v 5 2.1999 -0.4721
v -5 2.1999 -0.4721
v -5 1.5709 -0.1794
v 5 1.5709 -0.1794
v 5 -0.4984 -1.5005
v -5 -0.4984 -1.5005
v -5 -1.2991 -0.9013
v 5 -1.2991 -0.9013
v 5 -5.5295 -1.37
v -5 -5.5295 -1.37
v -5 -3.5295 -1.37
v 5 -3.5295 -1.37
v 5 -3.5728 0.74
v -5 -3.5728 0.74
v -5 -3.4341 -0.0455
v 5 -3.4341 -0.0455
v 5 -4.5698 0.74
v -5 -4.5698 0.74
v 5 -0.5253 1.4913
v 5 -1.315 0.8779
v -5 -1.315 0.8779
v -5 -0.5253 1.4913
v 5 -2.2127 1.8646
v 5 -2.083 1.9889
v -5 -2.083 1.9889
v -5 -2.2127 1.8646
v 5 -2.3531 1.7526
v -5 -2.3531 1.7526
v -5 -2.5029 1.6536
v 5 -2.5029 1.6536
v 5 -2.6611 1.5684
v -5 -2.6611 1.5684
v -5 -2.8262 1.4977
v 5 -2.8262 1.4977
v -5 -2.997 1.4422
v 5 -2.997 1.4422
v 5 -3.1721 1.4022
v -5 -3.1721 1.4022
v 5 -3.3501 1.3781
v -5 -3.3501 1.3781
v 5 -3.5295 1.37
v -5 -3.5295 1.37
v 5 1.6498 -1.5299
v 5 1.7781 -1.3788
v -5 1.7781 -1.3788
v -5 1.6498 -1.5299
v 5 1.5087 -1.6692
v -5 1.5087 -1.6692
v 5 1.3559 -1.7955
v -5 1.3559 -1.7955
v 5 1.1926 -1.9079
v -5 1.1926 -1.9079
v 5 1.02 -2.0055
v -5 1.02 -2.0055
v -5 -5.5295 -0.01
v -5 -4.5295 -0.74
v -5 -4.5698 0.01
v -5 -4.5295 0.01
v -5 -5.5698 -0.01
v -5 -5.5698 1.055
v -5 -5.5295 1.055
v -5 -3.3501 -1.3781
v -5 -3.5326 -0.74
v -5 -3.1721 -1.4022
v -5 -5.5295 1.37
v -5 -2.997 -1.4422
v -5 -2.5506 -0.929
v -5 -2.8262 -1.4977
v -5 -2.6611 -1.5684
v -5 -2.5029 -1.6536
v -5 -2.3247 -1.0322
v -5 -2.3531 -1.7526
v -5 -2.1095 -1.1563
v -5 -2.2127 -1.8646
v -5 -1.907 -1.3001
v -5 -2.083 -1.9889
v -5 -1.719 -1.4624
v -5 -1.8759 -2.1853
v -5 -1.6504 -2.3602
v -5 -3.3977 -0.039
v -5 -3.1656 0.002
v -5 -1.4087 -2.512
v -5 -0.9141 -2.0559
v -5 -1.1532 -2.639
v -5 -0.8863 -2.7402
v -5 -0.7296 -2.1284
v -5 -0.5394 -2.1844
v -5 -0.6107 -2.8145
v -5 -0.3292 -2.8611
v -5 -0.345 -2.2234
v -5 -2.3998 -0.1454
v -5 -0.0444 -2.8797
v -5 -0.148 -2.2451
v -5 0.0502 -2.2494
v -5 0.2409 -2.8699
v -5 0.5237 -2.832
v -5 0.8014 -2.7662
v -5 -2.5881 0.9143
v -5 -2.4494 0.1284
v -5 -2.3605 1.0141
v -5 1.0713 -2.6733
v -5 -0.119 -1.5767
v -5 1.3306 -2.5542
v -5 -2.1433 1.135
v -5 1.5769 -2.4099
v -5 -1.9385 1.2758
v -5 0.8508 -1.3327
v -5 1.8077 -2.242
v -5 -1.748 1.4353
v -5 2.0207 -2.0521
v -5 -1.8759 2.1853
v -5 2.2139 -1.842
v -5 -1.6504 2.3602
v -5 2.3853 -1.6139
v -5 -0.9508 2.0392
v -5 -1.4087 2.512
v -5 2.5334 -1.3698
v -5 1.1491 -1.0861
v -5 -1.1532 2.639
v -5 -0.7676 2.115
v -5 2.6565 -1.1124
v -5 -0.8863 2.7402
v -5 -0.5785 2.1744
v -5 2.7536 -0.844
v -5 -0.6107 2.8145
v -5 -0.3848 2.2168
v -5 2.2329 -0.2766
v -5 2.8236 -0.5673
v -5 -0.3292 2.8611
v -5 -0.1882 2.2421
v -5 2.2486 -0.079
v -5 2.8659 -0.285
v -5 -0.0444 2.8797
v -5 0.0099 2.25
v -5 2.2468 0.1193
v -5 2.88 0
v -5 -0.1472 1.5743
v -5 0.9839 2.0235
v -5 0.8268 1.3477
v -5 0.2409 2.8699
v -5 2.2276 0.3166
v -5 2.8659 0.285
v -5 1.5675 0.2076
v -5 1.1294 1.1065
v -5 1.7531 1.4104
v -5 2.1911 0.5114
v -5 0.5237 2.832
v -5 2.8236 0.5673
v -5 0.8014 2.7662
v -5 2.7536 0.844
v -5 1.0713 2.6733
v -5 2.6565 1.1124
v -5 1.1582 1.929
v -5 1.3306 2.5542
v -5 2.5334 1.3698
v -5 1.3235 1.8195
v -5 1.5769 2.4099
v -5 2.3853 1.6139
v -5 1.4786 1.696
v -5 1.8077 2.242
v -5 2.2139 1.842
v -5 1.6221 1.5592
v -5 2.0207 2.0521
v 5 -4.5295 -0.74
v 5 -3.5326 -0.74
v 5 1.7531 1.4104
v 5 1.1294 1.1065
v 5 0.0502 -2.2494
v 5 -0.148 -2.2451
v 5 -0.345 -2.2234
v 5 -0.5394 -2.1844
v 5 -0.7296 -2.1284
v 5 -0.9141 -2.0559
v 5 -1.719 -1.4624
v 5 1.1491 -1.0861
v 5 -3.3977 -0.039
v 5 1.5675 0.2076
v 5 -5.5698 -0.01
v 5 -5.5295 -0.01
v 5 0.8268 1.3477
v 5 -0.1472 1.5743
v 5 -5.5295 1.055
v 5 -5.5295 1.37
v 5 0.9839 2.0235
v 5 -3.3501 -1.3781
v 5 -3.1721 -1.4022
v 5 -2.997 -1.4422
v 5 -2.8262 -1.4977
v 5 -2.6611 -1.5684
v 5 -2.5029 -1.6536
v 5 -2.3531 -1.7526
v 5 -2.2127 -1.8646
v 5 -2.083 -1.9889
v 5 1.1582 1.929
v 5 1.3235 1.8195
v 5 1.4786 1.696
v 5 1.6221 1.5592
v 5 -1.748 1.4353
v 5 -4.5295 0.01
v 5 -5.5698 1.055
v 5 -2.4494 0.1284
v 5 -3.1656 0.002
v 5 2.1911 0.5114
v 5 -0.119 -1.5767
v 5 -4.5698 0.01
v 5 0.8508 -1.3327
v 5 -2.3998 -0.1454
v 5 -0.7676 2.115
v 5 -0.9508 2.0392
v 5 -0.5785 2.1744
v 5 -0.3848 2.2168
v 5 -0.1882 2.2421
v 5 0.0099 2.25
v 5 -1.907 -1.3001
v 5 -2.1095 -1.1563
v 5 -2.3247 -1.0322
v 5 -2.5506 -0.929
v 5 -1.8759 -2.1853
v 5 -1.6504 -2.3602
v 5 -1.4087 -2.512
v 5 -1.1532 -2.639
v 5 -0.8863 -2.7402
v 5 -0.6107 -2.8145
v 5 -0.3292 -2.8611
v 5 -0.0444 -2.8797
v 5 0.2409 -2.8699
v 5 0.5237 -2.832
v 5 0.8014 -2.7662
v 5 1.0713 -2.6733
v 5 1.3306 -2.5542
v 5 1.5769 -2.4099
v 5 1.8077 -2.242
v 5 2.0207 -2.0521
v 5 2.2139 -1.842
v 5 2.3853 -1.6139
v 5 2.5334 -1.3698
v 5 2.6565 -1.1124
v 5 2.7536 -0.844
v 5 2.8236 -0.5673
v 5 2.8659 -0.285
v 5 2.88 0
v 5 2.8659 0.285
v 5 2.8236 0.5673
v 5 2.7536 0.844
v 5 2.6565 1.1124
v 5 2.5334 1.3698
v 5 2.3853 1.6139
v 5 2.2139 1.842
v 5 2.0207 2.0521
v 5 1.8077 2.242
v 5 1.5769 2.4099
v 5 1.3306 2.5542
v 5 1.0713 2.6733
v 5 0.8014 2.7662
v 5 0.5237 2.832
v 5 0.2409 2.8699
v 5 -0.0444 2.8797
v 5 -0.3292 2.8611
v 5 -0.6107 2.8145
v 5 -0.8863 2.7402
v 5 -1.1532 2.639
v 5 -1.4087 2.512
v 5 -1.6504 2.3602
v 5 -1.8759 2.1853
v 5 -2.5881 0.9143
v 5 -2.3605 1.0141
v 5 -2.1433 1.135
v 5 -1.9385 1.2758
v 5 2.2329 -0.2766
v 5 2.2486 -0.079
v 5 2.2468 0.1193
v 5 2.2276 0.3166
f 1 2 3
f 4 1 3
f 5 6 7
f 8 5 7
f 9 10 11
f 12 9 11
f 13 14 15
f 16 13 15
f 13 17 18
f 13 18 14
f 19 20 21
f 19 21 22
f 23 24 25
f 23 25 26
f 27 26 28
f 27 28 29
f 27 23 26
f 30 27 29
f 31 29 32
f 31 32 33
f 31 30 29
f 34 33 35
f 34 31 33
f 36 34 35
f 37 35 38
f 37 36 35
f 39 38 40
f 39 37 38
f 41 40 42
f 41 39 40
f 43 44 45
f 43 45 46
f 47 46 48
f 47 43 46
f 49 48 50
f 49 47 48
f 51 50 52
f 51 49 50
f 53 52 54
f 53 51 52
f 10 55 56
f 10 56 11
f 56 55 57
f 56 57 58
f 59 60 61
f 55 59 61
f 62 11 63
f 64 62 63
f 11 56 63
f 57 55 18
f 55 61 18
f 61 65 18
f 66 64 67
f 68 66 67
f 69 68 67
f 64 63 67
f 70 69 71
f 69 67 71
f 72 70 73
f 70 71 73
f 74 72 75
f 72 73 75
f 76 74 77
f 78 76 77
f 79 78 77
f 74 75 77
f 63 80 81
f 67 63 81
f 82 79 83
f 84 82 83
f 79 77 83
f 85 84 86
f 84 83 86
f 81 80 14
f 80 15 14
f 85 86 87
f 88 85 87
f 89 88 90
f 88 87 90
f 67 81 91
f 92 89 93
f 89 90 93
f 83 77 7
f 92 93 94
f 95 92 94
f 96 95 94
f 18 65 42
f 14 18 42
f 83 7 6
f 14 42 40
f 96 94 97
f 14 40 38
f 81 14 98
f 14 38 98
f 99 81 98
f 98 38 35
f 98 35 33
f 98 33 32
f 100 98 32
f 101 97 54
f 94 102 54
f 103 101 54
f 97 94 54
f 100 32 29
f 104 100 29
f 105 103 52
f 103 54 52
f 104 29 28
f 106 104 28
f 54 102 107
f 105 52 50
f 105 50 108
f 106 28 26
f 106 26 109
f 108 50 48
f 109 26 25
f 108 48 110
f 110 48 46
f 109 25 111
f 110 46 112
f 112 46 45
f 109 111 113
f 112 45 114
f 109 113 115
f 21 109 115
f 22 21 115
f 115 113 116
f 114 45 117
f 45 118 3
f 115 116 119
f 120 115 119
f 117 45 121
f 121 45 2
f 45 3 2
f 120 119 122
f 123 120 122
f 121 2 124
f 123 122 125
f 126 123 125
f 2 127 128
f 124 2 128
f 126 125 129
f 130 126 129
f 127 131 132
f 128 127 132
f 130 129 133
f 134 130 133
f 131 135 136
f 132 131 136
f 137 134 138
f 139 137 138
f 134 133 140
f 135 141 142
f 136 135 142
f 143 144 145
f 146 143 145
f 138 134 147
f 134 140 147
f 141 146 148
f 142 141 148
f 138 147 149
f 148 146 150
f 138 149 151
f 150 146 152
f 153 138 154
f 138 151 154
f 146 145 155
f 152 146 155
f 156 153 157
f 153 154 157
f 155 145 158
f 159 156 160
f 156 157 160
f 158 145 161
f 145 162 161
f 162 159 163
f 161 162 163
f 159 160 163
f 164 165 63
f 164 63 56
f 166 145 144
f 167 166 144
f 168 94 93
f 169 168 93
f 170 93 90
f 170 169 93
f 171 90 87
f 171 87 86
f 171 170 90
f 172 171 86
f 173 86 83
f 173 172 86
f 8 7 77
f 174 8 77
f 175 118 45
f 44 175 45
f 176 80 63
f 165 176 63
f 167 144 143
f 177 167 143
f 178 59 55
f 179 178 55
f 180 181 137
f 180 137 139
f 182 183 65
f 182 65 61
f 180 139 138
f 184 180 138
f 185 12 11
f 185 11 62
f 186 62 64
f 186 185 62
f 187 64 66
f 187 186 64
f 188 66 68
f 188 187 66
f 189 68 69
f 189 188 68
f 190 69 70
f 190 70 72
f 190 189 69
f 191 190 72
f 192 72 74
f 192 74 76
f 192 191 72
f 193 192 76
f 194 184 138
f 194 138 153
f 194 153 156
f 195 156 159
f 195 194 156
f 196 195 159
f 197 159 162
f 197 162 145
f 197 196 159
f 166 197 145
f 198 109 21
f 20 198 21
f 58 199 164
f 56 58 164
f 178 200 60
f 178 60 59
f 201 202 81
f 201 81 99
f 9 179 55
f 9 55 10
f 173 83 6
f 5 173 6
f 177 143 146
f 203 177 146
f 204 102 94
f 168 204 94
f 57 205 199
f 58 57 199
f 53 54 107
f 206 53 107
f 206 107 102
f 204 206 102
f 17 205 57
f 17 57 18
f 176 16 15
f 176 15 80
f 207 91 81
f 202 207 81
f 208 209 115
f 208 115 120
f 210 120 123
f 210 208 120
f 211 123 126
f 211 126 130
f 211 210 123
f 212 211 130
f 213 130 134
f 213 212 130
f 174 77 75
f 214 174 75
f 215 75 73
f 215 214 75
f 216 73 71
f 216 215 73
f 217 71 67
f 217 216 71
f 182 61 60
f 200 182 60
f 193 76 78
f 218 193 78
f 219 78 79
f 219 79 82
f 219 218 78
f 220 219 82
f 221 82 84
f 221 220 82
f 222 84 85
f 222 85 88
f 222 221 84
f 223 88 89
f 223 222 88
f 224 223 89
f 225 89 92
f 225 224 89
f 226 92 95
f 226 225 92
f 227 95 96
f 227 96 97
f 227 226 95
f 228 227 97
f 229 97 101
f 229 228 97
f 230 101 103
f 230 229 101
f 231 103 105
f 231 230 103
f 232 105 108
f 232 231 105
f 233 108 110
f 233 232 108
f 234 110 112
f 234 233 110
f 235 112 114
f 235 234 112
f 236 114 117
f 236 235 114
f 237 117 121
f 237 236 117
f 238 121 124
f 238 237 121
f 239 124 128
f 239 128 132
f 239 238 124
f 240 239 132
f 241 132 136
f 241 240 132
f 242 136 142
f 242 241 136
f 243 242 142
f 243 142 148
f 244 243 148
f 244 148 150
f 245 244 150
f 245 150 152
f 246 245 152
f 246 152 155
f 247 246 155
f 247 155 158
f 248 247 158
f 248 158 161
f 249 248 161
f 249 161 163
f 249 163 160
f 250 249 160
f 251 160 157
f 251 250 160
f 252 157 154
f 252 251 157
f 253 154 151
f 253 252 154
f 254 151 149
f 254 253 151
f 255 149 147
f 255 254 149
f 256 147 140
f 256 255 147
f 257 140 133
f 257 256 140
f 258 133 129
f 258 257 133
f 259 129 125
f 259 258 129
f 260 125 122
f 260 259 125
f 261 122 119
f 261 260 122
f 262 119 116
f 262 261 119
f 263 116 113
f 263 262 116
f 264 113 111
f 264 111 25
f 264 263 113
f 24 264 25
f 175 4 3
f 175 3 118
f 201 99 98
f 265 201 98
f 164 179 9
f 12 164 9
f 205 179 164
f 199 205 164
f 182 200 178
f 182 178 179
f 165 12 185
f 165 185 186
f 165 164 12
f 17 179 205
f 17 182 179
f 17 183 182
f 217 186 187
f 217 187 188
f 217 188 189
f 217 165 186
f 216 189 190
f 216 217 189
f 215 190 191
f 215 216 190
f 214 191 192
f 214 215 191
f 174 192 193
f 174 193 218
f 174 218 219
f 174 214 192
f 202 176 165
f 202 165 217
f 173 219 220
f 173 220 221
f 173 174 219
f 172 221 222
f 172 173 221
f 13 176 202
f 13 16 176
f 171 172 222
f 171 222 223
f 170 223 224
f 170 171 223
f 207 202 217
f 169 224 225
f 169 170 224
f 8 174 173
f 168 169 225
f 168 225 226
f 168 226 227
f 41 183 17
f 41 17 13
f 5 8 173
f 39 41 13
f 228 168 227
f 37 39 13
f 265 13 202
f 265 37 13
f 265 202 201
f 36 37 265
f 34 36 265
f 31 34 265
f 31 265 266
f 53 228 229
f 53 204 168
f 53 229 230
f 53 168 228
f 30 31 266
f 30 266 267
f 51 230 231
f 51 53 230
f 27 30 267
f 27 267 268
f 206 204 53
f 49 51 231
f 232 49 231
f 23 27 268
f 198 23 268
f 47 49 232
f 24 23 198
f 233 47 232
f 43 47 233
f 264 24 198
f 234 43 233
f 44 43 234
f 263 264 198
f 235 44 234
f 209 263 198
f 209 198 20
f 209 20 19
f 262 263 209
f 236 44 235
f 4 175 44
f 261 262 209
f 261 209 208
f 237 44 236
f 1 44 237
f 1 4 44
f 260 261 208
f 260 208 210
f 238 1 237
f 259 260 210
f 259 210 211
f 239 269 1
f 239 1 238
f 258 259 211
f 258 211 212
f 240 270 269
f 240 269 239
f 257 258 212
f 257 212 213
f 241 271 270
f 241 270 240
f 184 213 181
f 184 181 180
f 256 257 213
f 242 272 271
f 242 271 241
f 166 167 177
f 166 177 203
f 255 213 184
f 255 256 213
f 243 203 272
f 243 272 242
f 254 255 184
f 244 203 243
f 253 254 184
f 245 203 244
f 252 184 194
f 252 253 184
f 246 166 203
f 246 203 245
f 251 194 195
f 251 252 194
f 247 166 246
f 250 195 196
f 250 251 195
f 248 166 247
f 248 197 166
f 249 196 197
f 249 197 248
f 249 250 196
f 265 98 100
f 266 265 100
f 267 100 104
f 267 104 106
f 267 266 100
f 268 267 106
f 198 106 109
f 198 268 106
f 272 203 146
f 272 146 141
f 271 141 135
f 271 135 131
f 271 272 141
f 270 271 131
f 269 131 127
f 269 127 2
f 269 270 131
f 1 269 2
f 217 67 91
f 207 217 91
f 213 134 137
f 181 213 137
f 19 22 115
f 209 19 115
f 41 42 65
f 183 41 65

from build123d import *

# Parameters (mm, degrees)
BOSS_EXTRUDE1_DEPTH = 5
BOSS_EXTRUDE2_DEPTH = 10
CRVPATTERN1_START   = -5
CRVPATTERN1_DEPTH   = 10


# Read off the part's stored shape, not the designer's step: CrvPattern1
with BuildPart() as part:
    # Sketch1 → Boss-Extrude1 (new, symmetric)
    with BuildSketch(Plane(origin=(0, 0, 0), x_dir=(0, 0, -1), z_dir=(1, 0, 0))):
        with BuildLine():
            Line((-0.74, -4.899518381), (-0.74, -3.529518381))
            ThreePointArc((-0.74, -3.529518381), (-0.951991552, -2.495045015), (-1.553790984, -1.627339417))
            ThreePointArc((-1.553790984, -1.627339417), (0, 2.25), (1.553790984, -1.627339417))
            ThreePointArc((1.553790984, -1.627339417), (0.951991552, -2.495045015), (0.74, -3.529518381))
            Line((0.74, -3.529518381), (0.74, -4.899518381))
            Line((0.74, -4.899518381), (0.74, -5.529518381))
            Line((0.74, -5.529518381), (1.37, -5.529518381))
            Line((1.37, -5.529518381), (1.37, -3.529518381))
            ThreePointArc((1.37, -3.529518381), (1.531210305, -2.74284662), (1.988852459, -2.082994454))
            ThreePointArc((1.988852459, -2.082994454), (0, 2.88), (-1.988852459, -2.082994454))
            ThreePointArc((-1.988852459, -2.082994454), (-1.531210305, -2.74284662), (-1.37, -3.529518381))
            Line((-1.37, -3.529518381), (-1.37, -5.529518381))
            Line((-1.37, -5.529518381), (-0.74, -5.529518381))
            Line((-0.74, -5.529518381), (-0.74, -4.899518381))
        make_face()
    extrude(amount=BOSS_EXTRUDE1_DEPTH, both=True)

    # Sketch2 → Boss-Extrude2 (add)
    with BuildSketch(Plane(origin=(5, 0, 0), x_dir=(0, 0, -1), z_dir=(1, 0, 0))):
        Polygon((0.74, -5.529518381), (-0.01, -5.529518381), (-0.01, -4.529518381), (1.055, -4.529518381), (1.055, -5.529518381), align=None)
    extrude(amount=-BOSS_EXTRUDE2_DEPTH)

    # CrvPattern1 outline → CrvPattern1 (add)
    with BuildSketch(Plane.YZ.offset(CRVPATTERN1_START)):
        with BuildLine():
            Line((-3.434132874, -0.045450425), (-3.397683617, -0.03901399))
            Line((-3.397683617, -0.03901399), (-3.532580052, -0.74))
            Line((-3.532580052, -0.74), (-3.529518381, -0.74))
            ThreePointArc((-3.529518381, -0.74), (-3.03102155, -0.78767529), (-2.550597709, -0.928972692))
            Line((-2.550597709, -0.928972692), (-2.399805364, -0.145383976))
            Line((-2.399805364, -0.145383976), (-3.165558429, 0.00197611))
            Line((-3.165558429, 0.00197611), (-2.449368801, 0.128445298))
            Line((-2.449368801, 0.128445298), (-2.588131662, 0.914253465))
            ThreePointArc((-2.588131662, 0.914253465), (-3.050829227, 0.783930261), (-3.529518381, 0.74))
            Line((-3.529518381, 0.74), (-3.572832561, 0.74))
            Line((-3.572832561, 0.74), (-3.434132874, -0.045450425))
        make_face()
        Polygon((-4.569835686, 0.01), (-4.569835686, 0.74), (-5.529518381, 0.74), (-5.529518381, 1.055), (-5.569835686, 1.055), (-5.569835686, -0.01), (-5.529518381, -0.01), (-5.529518381, 0.01), align=None)
        with BuildLine():
            Line((-1.299068151, -0.901344517), (-1.718974467, -1.462428052))
            ThreePointArc((-1.718974467, -1.462428052), (-1.672594961, -1.507545863), (-1.627339417, -1.553790984))
            ThreePointArc((-1.627339417, -1.553790984), (-1.295295274, -1.839758178), (-0.914118043, -2.055939737))
            Line((-0.914118043, -2.055939737), (-0.498447811, -1.500516504))
            Line((-0.498447811, -1.500516504), (-1.299068151, -0.901344517))
        make_face()
        with BuildLine():
            ThreePointArc((-1.627339417, 1.553790984), (-1.686697501, 1.493590875), (-1.747959826, 1.435329714))
            Line((-1.747959826, 1.435329714), (-1.315009752, 0.877923318))
            Line((-1.315009752, 0.877923318), (-0.525253811, 1.491344505))
            Line((-0.525253811, 1.491344505), (-0.950809299, 2.039230658))
            ThreePointArc((-0.950809299, 2.039230658), (-1.311726198, 1.828079424), (-1.627339417, 1.553790984))
        make_face()
        with BuildLine():
            Line((-0.118991671, -1.576654998), (0.050236755, -2.249439101))
            ThreePointArc((0.050236755, -2.249439101), (0.548855993, -2.182030499), (1.020028088, -2.005503104))
            Line((1.020028088, -2.005503104), (0.850799662, -1.332719001))
            Line((0.850799662, -1.332719001), (-0.118991671, -1.576654998))
        make_face()
        with BuildLine():
            ThreePointArc((0.983930045, 2.023457849), (0.509670601, 2.191514517), (0.009923593, 2.249978116))
            Line((0.009923593, 2.249978116), (-0.147222825, 1.574269812))
            Line((-0.147222825, 1.574269812), (0.826783627, 1.347749545))
            Line((0.826783627, 1.347749545), (0.983930045, 2.023457849))
        make_face()
        with BuildLine():
            Line((1.149073188, -1.086108101), (1.77806433, -1.378762938))
            ThreePointArc((1.77806433, -1.378762938), (2.03999745, -0.949163002), (2.199914553, -0.472097404))
            Line((2.199914553, -0.472097404), (1.570923411, -0.179442568))
            Line((1.570923411, -0.179442568), (1.149073188, -1.086108101))
        make_face()
        with BuildLine():
            ThreePointArc((2.191102417, 0.511439339), (2.022663, 0.98556298), (1.753074426, 1.410400673))
            Line((1.753074426, 1.410400673), (1.129428004, 1.106522654))
            Line((1.129428004, 1.106522654), (1.567455996, 0.20756132))
            Line((1.567455996, 0.20756132), (2.191102417, 0.511439339))
        make_face()
    extrude(amount=CRVPATTERN1_DEPTH)


solid = part.part
